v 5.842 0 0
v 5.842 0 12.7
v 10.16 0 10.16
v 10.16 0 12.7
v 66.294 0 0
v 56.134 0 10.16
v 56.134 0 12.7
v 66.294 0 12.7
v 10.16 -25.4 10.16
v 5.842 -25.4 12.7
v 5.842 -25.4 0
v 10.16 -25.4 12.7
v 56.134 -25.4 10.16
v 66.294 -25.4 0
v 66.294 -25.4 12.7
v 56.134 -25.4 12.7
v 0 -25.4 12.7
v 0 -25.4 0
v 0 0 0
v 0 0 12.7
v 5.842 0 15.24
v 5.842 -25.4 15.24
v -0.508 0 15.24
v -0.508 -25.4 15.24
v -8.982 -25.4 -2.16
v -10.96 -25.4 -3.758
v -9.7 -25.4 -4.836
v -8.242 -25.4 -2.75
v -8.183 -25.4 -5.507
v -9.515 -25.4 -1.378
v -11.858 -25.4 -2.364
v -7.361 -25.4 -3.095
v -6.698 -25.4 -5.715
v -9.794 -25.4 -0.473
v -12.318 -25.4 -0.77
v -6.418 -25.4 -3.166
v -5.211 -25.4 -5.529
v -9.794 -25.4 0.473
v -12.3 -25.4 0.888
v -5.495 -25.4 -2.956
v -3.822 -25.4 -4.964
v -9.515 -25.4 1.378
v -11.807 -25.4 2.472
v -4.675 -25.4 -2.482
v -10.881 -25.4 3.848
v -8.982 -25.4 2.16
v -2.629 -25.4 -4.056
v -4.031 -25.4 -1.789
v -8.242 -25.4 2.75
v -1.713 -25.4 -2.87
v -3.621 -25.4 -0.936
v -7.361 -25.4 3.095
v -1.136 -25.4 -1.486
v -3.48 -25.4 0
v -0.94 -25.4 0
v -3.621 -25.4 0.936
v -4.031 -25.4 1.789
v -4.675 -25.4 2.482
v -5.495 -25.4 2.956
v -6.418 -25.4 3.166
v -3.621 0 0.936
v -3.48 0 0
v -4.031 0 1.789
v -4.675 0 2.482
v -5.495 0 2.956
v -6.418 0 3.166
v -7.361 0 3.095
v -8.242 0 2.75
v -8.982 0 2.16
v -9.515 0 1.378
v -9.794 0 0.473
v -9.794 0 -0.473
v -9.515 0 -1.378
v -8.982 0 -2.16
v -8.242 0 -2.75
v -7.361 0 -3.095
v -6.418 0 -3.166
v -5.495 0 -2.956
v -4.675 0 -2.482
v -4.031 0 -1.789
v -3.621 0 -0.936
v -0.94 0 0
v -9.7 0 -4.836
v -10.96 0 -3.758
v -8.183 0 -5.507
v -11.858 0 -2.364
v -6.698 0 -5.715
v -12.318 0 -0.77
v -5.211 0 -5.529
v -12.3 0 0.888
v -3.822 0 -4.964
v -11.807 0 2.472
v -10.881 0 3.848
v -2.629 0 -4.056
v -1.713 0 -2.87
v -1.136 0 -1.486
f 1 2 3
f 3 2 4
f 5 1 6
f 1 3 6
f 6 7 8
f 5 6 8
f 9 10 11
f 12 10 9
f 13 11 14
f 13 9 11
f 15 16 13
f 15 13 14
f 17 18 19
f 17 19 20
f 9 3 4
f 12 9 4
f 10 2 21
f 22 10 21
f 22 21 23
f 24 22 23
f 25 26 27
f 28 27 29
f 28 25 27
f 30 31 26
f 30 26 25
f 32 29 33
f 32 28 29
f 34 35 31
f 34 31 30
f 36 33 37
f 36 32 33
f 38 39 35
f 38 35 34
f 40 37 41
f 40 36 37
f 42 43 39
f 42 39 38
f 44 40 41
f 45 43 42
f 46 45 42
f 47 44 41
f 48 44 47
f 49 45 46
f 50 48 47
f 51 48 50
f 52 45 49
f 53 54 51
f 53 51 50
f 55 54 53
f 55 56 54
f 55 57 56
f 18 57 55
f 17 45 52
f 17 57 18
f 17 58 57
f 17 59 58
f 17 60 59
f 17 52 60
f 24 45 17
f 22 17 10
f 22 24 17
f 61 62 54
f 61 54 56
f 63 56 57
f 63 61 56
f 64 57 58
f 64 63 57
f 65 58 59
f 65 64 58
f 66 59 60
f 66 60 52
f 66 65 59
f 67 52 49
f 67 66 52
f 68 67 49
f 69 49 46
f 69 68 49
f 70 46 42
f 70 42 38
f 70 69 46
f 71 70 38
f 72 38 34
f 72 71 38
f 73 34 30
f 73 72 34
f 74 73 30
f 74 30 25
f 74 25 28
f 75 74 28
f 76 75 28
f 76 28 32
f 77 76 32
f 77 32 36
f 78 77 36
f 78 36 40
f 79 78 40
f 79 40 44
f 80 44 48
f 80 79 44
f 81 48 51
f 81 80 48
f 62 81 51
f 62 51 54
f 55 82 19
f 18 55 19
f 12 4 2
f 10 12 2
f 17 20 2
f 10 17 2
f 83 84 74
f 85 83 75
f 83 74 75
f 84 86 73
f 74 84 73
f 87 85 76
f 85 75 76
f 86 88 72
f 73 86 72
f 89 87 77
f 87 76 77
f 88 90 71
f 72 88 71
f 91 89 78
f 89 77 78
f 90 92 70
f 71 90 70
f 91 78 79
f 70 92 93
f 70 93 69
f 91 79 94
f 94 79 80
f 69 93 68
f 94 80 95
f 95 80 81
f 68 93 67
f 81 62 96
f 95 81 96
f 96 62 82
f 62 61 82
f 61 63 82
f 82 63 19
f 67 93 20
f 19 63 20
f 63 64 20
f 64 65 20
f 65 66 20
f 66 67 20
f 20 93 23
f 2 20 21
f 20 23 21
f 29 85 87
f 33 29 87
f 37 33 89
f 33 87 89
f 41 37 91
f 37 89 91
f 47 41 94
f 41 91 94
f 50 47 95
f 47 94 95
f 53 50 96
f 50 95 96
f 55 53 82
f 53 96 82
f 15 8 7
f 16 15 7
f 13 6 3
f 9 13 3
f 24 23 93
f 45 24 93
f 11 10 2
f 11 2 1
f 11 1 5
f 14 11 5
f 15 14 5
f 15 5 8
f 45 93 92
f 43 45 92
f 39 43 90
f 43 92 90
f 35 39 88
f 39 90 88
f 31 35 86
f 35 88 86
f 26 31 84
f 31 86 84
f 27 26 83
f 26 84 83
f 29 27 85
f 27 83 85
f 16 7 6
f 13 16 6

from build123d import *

# Parameters (mm, degrees)
F0_R     = 3.175
F1_DEPTH = 25.4
F2_DEPTH = 25.4


with BuildPart() as f1:
    # F0 (on Front) → F1 (new body)
    with BuildSketch(Plane.XZ):
        with BuildLine():
            Line((-0.9398, 0), (0, 0))
            Line((0, 0), (0, 12.7))
            Line((0, 12.7), (5.842, 12.7))
            Line((5.842, 12.7), (5.842, 15.24))
            Line((5.842, 15.24), (-0.508, 15.24))
            Line((-0.508, 15.24), (-10.88063, 3.847543))
            ThreePointArc((-10.88063, 3.847543), (-4.591961, 5.329721), (-0.9398, 0))
        make_face()
        with BuildLine():
            ThreePointArc((-8.182663, -5.506983), (-3.195791, -4.549339), (-0.9398, 0))
            ThreePointArc((-0.9398, 0), (-4.591961, 5.329721), (-10.88063, 3.847543))
            ThreePointArc((-10.88063, 3.847543), (-12.145978, -1.583727), (-8.182663, -5.506983))
        make_face()
        with Locations((-6.6548, 0)):
            Circle(F0_R, mode=Mode.SUBTRACT)
    extrude(amount=F1_DEPTH)


with BuildPart() as f2:
    # F0 (on Front) → F2 (new body)
    with BuildSketch(Plane.XZ):
        Polygon((5.842, 12.7), (5.842, 0), (66.294, 0), (66.294, 12.7), (56.134, 12.7), (56.134, 10.16), (10.16, 10.16), (10.16, 12.7), align=None)
    extrude(amount=F2_DEPTH)


solid = Compound([f1.part, f2.part])
